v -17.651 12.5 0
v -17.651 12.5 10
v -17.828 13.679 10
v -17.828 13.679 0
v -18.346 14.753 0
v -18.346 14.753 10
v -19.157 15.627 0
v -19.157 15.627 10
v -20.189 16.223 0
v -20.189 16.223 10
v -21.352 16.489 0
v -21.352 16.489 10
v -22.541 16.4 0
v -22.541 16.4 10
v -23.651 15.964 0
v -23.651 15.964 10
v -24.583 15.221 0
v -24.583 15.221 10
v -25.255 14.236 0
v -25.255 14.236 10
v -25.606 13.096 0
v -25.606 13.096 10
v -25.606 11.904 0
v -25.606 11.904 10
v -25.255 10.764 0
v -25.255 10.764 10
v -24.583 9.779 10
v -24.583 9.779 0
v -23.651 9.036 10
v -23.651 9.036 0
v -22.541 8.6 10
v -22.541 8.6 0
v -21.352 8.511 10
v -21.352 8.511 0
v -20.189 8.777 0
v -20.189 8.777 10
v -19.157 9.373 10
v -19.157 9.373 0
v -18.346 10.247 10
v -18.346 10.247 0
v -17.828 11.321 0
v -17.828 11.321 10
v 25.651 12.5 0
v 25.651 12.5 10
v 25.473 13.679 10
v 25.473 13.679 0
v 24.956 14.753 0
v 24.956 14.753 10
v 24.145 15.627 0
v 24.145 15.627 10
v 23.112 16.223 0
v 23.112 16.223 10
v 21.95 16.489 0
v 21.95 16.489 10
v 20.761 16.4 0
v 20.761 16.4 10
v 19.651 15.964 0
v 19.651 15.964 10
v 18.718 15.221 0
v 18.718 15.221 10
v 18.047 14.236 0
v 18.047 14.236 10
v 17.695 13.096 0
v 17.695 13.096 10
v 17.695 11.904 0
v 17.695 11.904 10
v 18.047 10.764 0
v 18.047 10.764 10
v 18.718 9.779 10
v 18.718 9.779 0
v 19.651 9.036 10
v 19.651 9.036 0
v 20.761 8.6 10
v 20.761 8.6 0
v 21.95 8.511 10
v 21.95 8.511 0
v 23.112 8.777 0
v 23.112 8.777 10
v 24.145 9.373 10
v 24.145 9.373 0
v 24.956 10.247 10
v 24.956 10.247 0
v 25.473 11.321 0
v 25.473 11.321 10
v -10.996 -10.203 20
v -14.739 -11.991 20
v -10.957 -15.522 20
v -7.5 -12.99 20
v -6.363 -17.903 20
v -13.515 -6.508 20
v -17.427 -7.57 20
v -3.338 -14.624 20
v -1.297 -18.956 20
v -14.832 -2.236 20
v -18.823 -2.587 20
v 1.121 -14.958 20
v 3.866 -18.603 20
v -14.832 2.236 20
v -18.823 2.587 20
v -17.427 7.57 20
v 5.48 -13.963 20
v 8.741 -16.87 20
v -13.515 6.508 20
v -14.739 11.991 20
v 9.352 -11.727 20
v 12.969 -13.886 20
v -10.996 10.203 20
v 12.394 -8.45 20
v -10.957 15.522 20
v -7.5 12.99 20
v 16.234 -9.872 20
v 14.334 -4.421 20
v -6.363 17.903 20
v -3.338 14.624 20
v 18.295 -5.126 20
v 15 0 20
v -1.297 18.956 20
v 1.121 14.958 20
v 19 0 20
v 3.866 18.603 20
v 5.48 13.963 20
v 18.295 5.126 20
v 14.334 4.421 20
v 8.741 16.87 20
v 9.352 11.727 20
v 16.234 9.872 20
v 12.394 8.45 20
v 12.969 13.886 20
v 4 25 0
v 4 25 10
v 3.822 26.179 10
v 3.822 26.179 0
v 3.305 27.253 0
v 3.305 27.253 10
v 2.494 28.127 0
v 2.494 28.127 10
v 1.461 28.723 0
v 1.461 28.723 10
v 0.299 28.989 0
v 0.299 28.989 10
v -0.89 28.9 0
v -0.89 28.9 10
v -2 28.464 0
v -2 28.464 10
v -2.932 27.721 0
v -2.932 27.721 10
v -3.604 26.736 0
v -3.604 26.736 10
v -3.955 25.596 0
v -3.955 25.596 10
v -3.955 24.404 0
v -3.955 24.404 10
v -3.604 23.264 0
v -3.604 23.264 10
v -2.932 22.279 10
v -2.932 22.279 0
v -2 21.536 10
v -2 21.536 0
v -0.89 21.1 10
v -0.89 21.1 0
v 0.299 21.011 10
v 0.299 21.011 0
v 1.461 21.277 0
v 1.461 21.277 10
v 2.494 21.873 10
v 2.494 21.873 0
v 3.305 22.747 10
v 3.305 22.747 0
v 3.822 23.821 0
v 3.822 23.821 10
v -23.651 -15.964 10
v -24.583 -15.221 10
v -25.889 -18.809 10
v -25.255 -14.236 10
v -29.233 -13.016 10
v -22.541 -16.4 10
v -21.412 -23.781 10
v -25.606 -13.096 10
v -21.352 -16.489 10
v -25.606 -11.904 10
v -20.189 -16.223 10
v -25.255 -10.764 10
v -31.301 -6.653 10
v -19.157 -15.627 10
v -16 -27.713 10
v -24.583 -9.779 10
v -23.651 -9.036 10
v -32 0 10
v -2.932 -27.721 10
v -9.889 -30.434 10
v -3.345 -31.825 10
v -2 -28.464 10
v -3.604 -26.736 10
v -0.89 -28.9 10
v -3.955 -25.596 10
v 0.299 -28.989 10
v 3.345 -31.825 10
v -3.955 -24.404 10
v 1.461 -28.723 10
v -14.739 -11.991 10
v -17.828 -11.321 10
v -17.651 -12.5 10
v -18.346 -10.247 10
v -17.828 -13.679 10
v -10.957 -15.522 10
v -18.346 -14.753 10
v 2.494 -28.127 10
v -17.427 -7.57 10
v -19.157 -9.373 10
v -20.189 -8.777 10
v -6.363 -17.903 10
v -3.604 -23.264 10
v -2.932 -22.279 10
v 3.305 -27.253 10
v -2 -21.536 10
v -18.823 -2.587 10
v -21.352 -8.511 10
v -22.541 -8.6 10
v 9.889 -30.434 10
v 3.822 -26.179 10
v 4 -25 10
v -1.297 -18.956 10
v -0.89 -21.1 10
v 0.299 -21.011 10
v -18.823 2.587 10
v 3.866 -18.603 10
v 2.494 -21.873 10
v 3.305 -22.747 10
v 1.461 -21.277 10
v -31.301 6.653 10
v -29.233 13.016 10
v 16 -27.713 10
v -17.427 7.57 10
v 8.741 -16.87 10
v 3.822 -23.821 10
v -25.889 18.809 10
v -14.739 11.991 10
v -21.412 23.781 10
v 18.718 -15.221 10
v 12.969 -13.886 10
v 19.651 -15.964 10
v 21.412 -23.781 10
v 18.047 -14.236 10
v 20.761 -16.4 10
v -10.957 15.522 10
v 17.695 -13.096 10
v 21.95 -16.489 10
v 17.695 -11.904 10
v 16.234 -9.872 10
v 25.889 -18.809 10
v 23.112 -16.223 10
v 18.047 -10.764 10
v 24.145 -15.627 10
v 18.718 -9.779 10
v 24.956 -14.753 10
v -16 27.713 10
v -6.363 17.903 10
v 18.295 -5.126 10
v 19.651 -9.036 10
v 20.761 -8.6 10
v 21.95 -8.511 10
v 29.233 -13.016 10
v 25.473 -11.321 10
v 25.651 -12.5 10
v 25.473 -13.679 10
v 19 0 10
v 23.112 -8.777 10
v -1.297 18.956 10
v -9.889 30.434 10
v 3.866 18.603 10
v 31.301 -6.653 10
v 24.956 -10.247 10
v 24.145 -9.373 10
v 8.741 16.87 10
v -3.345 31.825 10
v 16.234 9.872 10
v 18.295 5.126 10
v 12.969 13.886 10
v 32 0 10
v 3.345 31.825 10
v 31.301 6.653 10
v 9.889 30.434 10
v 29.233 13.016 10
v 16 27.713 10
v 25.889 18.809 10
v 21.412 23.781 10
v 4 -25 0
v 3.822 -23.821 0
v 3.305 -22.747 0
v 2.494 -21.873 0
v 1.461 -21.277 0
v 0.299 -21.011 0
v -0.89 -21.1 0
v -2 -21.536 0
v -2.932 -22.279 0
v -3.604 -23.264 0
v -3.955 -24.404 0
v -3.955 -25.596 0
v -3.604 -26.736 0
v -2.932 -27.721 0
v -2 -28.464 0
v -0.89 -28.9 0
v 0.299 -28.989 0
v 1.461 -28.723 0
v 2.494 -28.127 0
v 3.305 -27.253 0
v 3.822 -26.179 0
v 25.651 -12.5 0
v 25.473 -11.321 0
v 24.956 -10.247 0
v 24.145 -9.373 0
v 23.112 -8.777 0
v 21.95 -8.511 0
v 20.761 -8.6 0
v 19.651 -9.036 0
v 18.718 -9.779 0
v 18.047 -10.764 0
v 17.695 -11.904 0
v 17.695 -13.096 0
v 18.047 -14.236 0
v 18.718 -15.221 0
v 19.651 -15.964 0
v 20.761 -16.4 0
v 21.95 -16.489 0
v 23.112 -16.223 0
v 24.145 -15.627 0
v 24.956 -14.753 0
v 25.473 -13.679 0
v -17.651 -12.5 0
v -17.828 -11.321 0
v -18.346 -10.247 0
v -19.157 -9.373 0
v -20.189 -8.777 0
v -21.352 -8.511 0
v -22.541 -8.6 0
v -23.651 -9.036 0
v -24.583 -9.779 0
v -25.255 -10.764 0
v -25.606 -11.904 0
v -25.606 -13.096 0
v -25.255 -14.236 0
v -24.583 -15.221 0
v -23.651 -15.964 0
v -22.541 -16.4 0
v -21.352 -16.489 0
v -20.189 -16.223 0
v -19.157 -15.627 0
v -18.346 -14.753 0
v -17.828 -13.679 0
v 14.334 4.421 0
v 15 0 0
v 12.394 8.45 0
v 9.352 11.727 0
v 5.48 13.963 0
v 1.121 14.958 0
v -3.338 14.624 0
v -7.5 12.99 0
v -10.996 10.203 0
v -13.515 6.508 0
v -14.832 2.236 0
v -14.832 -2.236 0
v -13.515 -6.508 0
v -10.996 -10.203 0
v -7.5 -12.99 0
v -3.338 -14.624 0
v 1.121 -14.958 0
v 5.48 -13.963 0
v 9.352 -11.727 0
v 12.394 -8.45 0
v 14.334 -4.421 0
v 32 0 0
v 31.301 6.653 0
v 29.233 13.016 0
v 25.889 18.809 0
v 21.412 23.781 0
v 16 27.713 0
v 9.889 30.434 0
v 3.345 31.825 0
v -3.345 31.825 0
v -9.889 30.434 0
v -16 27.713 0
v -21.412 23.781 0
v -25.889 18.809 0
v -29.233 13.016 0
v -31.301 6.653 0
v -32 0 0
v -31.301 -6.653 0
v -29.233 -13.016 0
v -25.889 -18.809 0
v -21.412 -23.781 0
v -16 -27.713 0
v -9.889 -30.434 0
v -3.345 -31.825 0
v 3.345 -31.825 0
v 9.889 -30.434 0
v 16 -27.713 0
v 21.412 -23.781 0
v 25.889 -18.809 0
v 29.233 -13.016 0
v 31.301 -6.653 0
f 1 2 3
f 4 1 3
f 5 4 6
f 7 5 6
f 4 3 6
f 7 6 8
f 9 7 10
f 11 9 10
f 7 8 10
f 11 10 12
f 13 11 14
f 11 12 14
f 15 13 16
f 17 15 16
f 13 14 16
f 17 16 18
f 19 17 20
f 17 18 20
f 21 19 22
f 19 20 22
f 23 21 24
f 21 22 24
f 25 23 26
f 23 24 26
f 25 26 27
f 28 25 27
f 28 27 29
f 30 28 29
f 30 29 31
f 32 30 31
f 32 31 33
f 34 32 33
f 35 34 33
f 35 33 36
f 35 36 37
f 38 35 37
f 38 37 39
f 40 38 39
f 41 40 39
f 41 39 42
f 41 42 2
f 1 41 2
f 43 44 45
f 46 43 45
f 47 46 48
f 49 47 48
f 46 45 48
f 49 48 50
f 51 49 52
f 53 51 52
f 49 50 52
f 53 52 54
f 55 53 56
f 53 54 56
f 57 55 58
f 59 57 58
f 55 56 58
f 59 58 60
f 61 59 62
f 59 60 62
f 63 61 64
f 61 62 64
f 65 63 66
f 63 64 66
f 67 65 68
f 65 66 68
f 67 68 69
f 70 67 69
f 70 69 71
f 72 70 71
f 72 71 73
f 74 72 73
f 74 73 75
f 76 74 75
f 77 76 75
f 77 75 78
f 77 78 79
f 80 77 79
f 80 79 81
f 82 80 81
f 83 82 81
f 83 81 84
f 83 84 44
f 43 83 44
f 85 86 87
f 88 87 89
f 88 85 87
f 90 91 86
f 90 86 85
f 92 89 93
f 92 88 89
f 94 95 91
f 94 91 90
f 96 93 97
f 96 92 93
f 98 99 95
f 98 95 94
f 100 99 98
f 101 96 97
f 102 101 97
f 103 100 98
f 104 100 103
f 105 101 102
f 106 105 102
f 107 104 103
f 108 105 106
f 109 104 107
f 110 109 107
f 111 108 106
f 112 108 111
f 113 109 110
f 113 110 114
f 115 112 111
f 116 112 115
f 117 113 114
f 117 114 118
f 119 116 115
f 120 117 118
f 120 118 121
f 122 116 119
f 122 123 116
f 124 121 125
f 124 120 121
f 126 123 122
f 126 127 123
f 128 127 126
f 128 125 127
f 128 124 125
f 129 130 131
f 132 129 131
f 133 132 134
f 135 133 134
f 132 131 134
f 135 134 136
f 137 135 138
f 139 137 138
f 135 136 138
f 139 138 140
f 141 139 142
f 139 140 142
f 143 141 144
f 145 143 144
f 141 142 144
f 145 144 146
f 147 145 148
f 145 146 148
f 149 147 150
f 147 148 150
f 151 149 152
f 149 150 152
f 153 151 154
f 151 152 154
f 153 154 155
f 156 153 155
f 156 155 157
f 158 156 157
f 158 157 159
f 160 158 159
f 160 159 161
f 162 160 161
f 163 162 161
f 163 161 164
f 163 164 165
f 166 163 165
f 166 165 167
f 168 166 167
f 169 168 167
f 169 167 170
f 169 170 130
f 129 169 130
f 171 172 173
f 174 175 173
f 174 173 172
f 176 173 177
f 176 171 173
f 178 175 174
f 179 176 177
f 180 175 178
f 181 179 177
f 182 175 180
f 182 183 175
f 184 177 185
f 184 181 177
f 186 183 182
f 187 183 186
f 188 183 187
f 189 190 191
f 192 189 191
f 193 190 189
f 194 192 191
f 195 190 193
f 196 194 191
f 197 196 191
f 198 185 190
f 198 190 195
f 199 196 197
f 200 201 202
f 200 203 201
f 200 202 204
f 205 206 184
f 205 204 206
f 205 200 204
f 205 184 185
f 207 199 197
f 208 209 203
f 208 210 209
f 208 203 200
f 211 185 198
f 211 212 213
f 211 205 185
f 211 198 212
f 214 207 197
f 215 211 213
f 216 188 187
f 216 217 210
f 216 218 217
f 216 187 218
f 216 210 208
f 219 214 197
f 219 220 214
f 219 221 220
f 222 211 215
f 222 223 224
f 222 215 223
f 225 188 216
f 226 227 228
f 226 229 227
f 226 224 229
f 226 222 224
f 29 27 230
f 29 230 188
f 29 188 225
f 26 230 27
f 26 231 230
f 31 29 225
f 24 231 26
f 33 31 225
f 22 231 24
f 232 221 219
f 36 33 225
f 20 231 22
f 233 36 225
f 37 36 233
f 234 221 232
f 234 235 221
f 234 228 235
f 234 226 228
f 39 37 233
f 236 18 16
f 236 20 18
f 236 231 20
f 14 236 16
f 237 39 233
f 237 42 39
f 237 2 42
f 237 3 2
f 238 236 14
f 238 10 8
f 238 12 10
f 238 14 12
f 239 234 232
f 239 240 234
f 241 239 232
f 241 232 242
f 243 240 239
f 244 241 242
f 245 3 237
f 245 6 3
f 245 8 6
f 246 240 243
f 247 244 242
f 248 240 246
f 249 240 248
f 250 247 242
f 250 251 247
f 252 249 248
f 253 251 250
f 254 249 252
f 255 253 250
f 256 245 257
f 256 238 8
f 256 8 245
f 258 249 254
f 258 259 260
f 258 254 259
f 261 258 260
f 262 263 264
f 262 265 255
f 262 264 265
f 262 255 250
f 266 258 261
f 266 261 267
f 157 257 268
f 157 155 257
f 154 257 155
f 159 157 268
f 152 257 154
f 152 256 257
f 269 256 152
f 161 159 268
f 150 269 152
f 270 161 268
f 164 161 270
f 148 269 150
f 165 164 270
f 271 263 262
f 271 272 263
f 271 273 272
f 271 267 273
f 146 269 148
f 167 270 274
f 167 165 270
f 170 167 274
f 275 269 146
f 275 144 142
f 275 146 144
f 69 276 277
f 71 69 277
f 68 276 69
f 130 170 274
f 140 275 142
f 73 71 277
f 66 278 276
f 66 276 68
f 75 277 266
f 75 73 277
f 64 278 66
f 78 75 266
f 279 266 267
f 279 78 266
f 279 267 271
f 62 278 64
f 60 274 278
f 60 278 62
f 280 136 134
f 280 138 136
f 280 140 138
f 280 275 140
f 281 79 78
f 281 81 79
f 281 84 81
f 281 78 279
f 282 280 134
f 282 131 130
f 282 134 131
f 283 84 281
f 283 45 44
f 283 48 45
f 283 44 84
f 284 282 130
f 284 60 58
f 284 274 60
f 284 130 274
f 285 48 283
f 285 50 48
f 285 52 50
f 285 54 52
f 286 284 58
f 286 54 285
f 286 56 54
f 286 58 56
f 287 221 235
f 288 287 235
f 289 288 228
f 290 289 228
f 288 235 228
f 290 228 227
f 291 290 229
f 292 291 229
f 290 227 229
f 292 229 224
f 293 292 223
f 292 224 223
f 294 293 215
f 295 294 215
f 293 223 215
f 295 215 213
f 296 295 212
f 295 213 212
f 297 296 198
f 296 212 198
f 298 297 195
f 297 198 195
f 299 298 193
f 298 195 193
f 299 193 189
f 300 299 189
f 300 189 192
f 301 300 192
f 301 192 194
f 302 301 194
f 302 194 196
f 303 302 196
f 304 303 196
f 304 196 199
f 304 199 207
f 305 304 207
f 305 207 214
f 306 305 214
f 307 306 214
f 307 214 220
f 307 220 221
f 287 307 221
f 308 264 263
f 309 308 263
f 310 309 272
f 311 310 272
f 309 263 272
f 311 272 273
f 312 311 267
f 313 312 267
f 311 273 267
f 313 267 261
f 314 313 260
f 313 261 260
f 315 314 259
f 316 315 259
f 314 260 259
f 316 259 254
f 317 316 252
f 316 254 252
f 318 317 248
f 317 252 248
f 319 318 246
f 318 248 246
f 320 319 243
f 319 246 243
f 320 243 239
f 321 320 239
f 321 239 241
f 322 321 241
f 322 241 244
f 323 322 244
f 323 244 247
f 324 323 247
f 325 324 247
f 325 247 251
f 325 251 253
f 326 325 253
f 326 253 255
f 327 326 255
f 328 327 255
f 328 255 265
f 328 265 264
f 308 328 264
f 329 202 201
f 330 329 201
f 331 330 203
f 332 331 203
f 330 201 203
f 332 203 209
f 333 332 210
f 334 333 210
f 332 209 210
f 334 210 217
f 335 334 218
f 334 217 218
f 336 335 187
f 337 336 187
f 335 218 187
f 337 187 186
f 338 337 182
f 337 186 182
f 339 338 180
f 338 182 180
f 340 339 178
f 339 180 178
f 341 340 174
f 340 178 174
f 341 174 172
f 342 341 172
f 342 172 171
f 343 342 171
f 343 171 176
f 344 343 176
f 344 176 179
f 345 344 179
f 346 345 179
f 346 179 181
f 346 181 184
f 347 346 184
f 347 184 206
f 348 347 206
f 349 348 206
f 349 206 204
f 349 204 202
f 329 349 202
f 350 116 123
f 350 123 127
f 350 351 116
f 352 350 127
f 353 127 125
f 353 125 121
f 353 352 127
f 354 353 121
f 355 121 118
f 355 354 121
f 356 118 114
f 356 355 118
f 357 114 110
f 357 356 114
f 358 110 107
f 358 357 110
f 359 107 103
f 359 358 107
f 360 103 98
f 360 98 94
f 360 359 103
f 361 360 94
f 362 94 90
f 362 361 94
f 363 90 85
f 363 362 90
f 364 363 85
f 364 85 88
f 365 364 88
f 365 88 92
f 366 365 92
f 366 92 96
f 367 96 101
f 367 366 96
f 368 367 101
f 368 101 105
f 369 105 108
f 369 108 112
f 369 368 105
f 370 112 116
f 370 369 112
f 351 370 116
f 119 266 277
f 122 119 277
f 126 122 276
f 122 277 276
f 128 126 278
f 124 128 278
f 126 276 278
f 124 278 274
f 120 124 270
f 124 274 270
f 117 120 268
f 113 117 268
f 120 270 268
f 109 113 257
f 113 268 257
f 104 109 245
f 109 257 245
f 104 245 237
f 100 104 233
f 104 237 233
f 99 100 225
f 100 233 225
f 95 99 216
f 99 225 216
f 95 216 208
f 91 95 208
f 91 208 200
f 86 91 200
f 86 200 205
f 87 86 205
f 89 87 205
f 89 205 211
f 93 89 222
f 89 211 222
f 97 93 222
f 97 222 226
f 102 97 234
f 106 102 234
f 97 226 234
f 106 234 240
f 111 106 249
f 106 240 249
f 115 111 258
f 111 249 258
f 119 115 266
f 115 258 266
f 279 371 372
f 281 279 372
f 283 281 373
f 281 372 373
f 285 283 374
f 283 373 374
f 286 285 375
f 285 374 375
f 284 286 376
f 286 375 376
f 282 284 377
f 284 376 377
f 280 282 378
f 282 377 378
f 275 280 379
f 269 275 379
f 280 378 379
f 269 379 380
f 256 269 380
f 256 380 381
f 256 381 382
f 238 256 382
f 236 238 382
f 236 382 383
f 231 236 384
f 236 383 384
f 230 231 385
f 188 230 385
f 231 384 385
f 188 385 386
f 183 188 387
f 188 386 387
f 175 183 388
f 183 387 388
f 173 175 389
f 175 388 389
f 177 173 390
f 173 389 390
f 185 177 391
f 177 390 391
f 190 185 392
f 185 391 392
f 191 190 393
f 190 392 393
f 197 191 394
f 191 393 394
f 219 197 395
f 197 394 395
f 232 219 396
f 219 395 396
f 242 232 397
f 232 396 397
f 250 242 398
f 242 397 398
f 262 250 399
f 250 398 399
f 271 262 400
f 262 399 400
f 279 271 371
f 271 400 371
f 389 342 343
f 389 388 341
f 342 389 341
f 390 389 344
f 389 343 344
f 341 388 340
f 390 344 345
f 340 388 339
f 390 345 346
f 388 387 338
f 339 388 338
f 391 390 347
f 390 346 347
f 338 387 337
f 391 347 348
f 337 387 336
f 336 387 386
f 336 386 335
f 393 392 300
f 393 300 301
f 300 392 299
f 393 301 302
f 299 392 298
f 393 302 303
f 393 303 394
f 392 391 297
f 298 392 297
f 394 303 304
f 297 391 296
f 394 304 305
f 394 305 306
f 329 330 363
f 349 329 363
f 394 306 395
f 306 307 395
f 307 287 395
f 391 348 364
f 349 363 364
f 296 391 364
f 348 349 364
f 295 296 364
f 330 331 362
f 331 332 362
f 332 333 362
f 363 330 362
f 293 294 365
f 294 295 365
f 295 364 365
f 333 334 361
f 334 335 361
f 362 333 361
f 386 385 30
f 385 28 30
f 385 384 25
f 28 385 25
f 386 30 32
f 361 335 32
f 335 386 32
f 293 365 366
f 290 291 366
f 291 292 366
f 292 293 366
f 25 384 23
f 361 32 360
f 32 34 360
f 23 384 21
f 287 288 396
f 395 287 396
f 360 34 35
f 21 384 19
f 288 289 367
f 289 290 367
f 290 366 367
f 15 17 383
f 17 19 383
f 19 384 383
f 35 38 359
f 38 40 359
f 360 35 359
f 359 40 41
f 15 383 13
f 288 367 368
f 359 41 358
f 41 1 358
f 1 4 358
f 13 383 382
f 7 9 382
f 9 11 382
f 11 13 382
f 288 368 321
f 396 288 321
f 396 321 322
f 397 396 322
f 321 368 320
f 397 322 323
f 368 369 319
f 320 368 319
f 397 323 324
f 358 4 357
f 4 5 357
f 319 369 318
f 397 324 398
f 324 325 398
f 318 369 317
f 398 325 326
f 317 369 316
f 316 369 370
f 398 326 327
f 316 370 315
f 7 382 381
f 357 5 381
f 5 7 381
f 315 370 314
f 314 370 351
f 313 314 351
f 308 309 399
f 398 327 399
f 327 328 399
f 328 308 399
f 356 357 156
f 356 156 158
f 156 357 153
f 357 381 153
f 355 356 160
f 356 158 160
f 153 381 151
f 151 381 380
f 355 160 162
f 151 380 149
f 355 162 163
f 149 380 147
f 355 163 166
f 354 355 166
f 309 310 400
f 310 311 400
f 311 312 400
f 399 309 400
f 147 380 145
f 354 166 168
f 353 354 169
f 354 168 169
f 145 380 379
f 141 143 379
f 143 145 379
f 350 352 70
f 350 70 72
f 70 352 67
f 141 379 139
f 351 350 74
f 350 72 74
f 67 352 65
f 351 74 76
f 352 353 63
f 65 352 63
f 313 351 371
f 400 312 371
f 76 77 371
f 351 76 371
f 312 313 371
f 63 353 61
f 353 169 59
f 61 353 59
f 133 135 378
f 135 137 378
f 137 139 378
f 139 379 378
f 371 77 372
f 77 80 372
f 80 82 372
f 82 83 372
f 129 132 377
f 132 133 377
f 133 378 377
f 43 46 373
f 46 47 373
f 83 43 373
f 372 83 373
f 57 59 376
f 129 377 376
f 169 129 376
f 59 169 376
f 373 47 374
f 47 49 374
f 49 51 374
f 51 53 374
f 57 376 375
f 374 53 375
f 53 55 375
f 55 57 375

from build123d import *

# Parameters (mm, degrees)
SKETCH1_R           = 32
SKETCH1_R_2         = 15
BOSS_EXTRUDE1_DEPTH = 10
SKETCH2_R           = 19
SKETCH2_R_2         = 15
BOSS_EXTRUDE2_DEPTH = 10
SKETCH6_R           = 4
CUT_EXTRUDE1_DEPTH  = 11


with BuildPart() as part:
    # Sketch1 → Boss-Extrude1 (new body)
    with BuildSketch(Plane.XY):
        Circle(SKETCH1_R)
        Circle(SKETCH1_R_2, mode=Mode.SUBTRACT)
    extrude(amount=BOSS_EXTRUDE1_DEPTH)

    # Sketch2 → Boss-Extrude2 (add)
    with BuildSketch(Plane.XY.offset(10)):
        Circle(SKETCH2_R)
        Circle(SKETCH2_R_2, mode=Mode.SUBTRACT)
    extrude(amount=BOSS_EXTRUDE2_DEPTH)

    # Sketch6 → Cut-Extrude1 (cut, through all)
    with BuildSketch(Plane.XY.offset(10)):
        with Locations((-21.650635095, 12.5)):
            Circle(SKETCH6_R)
        with Locations((0, 25)):
            Circle(SKETCH6_R)
        with Locations((21.650635095, 12.5)):
            Circle(SKETCH6_R)
        with Locations((21.650635095, -12.5)):
            Circle(SKETCH6_R)
        with Locations((0, -25)):
            Circle(SKETCH6_R)
        with Locations((-21.650635095, -12.5)):
            Circle(SKETCH6_R)
    extrude(amount=-CUT_EXTRUDE1_DEPTH, mode=Mode.SUBTRACT)


solid = part.part
